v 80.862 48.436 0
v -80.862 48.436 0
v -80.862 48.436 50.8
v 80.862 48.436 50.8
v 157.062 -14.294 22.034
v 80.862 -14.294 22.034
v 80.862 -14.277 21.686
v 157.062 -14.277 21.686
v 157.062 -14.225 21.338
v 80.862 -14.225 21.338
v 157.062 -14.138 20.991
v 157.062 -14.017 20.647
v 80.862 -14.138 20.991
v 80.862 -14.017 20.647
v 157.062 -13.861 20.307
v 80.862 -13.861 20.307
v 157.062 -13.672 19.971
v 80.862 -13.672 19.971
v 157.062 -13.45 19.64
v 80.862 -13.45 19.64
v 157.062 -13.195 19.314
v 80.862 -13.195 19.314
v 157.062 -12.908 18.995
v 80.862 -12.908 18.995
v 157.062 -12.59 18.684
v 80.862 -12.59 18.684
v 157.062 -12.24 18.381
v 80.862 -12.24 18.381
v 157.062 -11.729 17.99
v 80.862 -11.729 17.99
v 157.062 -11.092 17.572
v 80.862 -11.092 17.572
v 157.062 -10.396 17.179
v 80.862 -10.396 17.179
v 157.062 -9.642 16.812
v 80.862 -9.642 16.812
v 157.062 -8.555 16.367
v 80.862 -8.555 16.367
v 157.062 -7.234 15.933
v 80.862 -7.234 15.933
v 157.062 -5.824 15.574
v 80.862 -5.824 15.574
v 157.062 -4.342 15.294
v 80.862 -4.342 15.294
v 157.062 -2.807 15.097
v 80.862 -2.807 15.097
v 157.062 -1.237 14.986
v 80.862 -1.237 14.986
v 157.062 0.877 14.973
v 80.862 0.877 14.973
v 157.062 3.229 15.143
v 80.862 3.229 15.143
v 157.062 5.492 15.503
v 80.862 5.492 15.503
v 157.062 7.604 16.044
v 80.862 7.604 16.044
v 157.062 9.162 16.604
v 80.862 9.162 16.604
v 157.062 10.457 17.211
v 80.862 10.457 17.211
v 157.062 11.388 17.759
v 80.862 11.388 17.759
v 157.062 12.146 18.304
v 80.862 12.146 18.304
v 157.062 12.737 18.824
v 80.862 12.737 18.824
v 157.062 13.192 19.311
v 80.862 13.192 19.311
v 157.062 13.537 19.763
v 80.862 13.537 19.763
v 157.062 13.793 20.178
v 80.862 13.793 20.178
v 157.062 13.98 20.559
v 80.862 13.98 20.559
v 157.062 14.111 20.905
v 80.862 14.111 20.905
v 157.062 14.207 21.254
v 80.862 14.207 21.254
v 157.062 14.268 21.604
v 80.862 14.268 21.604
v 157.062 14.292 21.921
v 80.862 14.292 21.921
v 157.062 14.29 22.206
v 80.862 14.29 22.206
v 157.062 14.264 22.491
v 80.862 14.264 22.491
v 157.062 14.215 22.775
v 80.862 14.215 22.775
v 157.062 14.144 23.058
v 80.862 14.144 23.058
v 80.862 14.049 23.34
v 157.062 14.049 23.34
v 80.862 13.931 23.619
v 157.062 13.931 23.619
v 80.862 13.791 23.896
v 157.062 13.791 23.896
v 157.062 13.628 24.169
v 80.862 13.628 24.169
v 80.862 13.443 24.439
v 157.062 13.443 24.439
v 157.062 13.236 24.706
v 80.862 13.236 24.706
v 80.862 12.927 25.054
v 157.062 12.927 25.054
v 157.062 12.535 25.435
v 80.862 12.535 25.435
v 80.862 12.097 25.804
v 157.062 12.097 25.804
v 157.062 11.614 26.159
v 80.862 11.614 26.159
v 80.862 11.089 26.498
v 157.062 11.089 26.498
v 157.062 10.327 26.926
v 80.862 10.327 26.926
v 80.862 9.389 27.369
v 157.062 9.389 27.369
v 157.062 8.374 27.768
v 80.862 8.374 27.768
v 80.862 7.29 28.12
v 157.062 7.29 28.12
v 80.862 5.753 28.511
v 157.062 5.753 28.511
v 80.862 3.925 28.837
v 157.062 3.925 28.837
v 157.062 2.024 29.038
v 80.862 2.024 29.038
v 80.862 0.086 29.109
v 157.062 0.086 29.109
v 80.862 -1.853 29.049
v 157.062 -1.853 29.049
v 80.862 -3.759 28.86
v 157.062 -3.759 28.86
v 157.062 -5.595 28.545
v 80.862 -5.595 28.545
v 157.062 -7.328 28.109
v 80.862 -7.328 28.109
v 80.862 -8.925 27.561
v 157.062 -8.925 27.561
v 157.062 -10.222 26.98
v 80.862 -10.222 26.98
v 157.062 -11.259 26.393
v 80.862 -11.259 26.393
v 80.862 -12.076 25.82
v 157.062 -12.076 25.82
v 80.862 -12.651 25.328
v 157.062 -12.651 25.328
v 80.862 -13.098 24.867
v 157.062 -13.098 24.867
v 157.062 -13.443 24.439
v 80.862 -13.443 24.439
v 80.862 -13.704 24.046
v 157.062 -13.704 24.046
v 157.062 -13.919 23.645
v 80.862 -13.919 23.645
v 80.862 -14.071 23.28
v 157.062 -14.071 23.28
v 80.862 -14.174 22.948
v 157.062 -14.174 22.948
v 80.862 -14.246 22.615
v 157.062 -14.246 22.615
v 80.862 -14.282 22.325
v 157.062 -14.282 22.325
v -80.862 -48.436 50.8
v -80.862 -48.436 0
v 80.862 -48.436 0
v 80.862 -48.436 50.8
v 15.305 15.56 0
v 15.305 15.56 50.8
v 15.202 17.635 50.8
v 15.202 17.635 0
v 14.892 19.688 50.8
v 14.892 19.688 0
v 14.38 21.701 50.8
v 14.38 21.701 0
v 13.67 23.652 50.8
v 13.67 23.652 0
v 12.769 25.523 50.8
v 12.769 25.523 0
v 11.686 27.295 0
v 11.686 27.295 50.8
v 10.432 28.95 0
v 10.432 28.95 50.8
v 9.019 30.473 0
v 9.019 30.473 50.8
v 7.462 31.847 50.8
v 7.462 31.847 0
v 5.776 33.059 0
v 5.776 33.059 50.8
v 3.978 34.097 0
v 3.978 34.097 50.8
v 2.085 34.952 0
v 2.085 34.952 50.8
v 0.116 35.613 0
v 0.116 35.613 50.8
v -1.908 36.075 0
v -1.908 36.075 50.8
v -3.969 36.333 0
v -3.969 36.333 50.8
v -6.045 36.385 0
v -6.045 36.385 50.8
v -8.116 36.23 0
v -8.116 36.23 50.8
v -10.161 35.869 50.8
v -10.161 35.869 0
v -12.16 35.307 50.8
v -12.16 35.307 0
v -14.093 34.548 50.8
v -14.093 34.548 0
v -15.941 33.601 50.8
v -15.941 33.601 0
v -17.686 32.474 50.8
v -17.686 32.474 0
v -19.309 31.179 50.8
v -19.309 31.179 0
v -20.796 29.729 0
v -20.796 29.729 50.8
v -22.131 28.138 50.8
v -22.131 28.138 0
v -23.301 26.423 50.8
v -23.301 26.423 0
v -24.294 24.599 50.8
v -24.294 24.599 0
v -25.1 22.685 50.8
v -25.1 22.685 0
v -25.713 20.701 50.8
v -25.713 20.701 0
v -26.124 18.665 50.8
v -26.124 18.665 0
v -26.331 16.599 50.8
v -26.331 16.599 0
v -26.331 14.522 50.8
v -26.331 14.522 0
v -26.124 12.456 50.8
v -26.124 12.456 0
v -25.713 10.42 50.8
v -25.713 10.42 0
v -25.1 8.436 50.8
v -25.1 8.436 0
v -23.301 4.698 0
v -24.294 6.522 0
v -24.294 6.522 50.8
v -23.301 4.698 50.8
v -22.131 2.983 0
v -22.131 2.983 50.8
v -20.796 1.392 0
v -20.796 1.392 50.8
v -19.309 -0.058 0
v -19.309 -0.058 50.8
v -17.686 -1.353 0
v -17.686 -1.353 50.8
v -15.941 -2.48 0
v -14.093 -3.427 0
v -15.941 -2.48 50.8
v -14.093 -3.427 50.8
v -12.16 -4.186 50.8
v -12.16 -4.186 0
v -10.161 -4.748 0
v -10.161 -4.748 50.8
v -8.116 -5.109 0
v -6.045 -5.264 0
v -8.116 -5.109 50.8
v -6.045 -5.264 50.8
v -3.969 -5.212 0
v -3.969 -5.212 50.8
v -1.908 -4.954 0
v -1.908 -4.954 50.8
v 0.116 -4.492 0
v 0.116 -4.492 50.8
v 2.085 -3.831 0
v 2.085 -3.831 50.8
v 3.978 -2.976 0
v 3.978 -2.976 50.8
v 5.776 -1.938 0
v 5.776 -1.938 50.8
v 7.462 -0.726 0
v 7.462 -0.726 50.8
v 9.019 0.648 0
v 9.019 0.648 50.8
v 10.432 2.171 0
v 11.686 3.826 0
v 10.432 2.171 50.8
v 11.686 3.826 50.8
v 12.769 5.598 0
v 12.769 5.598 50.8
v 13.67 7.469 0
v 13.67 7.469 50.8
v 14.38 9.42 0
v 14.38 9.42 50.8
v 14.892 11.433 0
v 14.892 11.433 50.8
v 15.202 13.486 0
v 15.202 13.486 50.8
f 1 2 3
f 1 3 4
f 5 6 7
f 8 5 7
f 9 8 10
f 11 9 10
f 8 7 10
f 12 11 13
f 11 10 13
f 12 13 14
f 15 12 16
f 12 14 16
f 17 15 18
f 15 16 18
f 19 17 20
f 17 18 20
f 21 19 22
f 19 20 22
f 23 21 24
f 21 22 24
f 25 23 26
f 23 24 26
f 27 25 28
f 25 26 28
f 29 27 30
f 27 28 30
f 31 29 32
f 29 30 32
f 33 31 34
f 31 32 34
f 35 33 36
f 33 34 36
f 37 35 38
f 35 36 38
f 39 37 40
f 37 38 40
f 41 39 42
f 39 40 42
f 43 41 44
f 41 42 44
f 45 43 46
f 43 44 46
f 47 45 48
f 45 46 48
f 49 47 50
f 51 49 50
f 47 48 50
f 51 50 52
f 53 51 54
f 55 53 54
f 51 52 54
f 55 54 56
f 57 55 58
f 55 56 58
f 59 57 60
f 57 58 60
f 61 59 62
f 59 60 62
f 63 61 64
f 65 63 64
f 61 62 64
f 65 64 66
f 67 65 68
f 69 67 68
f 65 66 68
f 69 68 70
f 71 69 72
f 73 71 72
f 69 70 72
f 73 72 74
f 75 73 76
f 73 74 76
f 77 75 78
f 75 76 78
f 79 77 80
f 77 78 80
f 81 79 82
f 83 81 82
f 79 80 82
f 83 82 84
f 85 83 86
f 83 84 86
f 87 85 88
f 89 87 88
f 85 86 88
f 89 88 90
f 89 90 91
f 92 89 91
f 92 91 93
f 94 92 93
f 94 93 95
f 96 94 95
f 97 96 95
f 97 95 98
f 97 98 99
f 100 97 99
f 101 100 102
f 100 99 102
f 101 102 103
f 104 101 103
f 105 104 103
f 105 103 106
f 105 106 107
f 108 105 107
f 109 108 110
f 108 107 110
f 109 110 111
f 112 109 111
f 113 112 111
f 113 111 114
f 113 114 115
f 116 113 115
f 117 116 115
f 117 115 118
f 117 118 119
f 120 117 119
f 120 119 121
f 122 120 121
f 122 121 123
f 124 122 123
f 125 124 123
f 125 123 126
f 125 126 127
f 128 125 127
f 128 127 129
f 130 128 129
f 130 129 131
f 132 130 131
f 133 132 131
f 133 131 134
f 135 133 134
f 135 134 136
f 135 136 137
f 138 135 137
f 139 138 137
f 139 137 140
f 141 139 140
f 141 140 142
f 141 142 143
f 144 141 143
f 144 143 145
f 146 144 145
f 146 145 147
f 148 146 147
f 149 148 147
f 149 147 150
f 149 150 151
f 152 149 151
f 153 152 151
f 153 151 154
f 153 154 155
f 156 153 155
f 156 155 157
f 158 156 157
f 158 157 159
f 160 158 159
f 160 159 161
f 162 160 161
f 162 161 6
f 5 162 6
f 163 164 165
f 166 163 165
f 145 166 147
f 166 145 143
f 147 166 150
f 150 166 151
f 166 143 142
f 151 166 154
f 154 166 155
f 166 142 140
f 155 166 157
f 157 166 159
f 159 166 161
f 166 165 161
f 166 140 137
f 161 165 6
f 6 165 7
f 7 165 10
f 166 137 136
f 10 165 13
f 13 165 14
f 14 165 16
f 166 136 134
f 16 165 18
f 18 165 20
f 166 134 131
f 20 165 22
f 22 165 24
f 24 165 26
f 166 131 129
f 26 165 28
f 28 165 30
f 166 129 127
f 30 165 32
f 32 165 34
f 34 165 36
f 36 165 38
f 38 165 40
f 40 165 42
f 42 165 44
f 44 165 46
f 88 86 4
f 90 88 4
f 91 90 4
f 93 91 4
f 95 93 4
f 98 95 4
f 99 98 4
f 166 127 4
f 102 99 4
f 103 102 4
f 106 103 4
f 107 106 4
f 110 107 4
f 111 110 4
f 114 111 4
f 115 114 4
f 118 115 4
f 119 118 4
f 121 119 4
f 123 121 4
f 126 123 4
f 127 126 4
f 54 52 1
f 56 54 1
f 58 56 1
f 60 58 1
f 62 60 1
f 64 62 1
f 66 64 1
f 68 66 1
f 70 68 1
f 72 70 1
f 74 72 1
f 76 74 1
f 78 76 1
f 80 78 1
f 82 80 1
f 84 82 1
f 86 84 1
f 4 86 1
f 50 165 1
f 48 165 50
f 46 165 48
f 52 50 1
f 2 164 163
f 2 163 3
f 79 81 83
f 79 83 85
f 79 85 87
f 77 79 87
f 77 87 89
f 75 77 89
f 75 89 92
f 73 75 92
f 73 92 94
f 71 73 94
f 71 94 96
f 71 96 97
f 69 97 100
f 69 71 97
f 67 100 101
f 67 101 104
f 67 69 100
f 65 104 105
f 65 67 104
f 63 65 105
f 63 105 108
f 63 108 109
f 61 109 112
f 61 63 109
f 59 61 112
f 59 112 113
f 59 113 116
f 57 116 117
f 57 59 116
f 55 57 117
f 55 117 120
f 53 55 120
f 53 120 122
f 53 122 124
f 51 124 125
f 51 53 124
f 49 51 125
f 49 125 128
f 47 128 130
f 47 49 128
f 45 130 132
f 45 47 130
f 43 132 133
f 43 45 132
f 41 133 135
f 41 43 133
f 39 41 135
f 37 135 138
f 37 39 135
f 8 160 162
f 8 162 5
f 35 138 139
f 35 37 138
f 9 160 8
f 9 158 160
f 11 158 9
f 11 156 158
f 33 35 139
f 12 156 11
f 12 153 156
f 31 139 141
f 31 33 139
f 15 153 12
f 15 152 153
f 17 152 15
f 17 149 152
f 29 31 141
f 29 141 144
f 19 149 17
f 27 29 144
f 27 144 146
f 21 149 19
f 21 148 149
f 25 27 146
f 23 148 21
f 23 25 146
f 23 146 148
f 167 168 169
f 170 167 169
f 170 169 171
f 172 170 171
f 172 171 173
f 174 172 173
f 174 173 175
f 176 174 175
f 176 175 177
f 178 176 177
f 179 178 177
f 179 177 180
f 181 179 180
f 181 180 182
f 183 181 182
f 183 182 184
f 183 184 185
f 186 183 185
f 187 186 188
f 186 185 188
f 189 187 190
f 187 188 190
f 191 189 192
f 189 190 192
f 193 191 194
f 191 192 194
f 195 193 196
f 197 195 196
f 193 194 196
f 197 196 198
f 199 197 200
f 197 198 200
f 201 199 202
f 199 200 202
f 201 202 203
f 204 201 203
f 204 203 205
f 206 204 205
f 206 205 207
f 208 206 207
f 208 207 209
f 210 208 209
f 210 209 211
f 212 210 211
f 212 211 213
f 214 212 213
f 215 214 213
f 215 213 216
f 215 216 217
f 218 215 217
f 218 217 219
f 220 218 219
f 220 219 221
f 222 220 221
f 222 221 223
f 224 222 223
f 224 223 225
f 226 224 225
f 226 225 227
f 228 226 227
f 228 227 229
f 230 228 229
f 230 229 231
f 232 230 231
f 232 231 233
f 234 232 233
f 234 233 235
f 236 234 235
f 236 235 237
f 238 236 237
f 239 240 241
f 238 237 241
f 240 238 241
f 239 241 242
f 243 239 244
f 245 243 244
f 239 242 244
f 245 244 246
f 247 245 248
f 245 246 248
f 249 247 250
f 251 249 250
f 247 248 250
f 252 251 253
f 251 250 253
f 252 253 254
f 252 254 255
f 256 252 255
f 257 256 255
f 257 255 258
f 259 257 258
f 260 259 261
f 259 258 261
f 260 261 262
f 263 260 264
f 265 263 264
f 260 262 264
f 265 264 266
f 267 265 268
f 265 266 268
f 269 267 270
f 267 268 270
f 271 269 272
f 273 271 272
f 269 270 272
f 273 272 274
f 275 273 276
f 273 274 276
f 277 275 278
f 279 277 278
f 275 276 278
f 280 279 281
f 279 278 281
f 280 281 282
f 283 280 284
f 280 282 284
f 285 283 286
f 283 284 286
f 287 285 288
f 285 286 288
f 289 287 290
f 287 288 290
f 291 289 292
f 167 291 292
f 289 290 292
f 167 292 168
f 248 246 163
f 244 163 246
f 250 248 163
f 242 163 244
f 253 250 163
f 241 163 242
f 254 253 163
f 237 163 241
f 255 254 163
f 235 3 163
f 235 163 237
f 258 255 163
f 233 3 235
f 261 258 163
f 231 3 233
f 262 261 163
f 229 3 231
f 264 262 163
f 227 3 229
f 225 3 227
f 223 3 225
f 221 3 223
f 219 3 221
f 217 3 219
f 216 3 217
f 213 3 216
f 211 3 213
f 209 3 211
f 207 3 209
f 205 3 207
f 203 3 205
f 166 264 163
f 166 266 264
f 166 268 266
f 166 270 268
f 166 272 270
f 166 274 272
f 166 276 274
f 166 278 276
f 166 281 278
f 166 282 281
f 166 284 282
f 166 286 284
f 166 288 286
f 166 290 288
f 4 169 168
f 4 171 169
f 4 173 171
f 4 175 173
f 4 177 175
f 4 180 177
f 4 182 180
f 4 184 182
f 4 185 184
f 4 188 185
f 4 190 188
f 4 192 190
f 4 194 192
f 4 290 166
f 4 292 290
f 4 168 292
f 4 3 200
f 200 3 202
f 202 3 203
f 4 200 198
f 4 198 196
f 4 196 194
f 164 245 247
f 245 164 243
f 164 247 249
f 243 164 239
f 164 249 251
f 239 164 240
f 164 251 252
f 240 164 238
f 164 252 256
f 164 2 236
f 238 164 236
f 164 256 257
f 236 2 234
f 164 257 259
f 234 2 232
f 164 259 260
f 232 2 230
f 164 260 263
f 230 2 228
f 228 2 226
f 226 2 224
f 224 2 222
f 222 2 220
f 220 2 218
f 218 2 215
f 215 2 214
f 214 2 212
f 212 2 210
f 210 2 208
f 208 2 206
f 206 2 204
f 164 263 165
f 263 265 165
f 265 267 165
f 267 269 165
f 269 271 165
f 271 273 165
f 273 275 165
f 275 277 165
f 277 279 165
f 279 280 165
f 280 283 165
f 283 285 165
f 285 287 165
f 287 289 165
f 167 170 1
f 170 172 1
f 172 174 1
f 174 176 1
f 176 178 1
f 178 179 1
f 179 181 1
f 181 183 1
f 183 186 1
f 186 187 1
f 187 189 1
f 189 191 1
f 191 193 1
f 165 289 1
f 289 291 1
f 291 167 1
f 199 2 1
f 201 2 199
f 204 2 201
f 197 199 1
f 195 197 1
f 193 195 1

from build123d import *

# Parameters (mm, degrees)
SKETCH1_W           = 161.724310644
SKETCH1_H           = 96.872862076
BOSS_EXTRUDE1_DEPTH = 50.8
SKETCH2_R           = 20.831004362
CUT_EXTRUDE1_DEPTH  = 51.8
SKETCH3_RX          = 14.294101548
SKETCH3_RY          = 7.07473185
BOSS_EXTRUDE2_DEPTH = 76.2


with BuildPart() as part:
    # Sketch1 → Boss-Extrude1 (new body)
    with BuildSketch(Plane.XY):
        Rectangle(SKETCH1_W, SKETCH1_H)
    extrude(amount=BOSS_EXTRUDE1_DEPTH)

    # Sketch2 → Cut-Extrude1 (cut, through all)
    with BuildSketch(Plane.XY.offset(50.8)):
        with Locations((-5.525694513, 15.560482637)):
            Circle(SKETCH2_R)
    extrude(amount=-CUT_EXTRUDE1_DEPTH, mode=Mode.SUBTRACT)

    # Sketch3 → Boss-Extrude2 (add)
    with BuildSketch(Plane(origin=(80.862155322, 0, 0), x_dir=(0, 0, -1), z_dir=(1, 0, 0))):
        with Locations(Location((-22.034477626, 0), (0, 0, -90))):
            Ellipse(SKETCH3_RX, SKETCH3_RY)
    extrude(amount=BOSS_EXTRUDE2_DEPTH)


solid = part.part
